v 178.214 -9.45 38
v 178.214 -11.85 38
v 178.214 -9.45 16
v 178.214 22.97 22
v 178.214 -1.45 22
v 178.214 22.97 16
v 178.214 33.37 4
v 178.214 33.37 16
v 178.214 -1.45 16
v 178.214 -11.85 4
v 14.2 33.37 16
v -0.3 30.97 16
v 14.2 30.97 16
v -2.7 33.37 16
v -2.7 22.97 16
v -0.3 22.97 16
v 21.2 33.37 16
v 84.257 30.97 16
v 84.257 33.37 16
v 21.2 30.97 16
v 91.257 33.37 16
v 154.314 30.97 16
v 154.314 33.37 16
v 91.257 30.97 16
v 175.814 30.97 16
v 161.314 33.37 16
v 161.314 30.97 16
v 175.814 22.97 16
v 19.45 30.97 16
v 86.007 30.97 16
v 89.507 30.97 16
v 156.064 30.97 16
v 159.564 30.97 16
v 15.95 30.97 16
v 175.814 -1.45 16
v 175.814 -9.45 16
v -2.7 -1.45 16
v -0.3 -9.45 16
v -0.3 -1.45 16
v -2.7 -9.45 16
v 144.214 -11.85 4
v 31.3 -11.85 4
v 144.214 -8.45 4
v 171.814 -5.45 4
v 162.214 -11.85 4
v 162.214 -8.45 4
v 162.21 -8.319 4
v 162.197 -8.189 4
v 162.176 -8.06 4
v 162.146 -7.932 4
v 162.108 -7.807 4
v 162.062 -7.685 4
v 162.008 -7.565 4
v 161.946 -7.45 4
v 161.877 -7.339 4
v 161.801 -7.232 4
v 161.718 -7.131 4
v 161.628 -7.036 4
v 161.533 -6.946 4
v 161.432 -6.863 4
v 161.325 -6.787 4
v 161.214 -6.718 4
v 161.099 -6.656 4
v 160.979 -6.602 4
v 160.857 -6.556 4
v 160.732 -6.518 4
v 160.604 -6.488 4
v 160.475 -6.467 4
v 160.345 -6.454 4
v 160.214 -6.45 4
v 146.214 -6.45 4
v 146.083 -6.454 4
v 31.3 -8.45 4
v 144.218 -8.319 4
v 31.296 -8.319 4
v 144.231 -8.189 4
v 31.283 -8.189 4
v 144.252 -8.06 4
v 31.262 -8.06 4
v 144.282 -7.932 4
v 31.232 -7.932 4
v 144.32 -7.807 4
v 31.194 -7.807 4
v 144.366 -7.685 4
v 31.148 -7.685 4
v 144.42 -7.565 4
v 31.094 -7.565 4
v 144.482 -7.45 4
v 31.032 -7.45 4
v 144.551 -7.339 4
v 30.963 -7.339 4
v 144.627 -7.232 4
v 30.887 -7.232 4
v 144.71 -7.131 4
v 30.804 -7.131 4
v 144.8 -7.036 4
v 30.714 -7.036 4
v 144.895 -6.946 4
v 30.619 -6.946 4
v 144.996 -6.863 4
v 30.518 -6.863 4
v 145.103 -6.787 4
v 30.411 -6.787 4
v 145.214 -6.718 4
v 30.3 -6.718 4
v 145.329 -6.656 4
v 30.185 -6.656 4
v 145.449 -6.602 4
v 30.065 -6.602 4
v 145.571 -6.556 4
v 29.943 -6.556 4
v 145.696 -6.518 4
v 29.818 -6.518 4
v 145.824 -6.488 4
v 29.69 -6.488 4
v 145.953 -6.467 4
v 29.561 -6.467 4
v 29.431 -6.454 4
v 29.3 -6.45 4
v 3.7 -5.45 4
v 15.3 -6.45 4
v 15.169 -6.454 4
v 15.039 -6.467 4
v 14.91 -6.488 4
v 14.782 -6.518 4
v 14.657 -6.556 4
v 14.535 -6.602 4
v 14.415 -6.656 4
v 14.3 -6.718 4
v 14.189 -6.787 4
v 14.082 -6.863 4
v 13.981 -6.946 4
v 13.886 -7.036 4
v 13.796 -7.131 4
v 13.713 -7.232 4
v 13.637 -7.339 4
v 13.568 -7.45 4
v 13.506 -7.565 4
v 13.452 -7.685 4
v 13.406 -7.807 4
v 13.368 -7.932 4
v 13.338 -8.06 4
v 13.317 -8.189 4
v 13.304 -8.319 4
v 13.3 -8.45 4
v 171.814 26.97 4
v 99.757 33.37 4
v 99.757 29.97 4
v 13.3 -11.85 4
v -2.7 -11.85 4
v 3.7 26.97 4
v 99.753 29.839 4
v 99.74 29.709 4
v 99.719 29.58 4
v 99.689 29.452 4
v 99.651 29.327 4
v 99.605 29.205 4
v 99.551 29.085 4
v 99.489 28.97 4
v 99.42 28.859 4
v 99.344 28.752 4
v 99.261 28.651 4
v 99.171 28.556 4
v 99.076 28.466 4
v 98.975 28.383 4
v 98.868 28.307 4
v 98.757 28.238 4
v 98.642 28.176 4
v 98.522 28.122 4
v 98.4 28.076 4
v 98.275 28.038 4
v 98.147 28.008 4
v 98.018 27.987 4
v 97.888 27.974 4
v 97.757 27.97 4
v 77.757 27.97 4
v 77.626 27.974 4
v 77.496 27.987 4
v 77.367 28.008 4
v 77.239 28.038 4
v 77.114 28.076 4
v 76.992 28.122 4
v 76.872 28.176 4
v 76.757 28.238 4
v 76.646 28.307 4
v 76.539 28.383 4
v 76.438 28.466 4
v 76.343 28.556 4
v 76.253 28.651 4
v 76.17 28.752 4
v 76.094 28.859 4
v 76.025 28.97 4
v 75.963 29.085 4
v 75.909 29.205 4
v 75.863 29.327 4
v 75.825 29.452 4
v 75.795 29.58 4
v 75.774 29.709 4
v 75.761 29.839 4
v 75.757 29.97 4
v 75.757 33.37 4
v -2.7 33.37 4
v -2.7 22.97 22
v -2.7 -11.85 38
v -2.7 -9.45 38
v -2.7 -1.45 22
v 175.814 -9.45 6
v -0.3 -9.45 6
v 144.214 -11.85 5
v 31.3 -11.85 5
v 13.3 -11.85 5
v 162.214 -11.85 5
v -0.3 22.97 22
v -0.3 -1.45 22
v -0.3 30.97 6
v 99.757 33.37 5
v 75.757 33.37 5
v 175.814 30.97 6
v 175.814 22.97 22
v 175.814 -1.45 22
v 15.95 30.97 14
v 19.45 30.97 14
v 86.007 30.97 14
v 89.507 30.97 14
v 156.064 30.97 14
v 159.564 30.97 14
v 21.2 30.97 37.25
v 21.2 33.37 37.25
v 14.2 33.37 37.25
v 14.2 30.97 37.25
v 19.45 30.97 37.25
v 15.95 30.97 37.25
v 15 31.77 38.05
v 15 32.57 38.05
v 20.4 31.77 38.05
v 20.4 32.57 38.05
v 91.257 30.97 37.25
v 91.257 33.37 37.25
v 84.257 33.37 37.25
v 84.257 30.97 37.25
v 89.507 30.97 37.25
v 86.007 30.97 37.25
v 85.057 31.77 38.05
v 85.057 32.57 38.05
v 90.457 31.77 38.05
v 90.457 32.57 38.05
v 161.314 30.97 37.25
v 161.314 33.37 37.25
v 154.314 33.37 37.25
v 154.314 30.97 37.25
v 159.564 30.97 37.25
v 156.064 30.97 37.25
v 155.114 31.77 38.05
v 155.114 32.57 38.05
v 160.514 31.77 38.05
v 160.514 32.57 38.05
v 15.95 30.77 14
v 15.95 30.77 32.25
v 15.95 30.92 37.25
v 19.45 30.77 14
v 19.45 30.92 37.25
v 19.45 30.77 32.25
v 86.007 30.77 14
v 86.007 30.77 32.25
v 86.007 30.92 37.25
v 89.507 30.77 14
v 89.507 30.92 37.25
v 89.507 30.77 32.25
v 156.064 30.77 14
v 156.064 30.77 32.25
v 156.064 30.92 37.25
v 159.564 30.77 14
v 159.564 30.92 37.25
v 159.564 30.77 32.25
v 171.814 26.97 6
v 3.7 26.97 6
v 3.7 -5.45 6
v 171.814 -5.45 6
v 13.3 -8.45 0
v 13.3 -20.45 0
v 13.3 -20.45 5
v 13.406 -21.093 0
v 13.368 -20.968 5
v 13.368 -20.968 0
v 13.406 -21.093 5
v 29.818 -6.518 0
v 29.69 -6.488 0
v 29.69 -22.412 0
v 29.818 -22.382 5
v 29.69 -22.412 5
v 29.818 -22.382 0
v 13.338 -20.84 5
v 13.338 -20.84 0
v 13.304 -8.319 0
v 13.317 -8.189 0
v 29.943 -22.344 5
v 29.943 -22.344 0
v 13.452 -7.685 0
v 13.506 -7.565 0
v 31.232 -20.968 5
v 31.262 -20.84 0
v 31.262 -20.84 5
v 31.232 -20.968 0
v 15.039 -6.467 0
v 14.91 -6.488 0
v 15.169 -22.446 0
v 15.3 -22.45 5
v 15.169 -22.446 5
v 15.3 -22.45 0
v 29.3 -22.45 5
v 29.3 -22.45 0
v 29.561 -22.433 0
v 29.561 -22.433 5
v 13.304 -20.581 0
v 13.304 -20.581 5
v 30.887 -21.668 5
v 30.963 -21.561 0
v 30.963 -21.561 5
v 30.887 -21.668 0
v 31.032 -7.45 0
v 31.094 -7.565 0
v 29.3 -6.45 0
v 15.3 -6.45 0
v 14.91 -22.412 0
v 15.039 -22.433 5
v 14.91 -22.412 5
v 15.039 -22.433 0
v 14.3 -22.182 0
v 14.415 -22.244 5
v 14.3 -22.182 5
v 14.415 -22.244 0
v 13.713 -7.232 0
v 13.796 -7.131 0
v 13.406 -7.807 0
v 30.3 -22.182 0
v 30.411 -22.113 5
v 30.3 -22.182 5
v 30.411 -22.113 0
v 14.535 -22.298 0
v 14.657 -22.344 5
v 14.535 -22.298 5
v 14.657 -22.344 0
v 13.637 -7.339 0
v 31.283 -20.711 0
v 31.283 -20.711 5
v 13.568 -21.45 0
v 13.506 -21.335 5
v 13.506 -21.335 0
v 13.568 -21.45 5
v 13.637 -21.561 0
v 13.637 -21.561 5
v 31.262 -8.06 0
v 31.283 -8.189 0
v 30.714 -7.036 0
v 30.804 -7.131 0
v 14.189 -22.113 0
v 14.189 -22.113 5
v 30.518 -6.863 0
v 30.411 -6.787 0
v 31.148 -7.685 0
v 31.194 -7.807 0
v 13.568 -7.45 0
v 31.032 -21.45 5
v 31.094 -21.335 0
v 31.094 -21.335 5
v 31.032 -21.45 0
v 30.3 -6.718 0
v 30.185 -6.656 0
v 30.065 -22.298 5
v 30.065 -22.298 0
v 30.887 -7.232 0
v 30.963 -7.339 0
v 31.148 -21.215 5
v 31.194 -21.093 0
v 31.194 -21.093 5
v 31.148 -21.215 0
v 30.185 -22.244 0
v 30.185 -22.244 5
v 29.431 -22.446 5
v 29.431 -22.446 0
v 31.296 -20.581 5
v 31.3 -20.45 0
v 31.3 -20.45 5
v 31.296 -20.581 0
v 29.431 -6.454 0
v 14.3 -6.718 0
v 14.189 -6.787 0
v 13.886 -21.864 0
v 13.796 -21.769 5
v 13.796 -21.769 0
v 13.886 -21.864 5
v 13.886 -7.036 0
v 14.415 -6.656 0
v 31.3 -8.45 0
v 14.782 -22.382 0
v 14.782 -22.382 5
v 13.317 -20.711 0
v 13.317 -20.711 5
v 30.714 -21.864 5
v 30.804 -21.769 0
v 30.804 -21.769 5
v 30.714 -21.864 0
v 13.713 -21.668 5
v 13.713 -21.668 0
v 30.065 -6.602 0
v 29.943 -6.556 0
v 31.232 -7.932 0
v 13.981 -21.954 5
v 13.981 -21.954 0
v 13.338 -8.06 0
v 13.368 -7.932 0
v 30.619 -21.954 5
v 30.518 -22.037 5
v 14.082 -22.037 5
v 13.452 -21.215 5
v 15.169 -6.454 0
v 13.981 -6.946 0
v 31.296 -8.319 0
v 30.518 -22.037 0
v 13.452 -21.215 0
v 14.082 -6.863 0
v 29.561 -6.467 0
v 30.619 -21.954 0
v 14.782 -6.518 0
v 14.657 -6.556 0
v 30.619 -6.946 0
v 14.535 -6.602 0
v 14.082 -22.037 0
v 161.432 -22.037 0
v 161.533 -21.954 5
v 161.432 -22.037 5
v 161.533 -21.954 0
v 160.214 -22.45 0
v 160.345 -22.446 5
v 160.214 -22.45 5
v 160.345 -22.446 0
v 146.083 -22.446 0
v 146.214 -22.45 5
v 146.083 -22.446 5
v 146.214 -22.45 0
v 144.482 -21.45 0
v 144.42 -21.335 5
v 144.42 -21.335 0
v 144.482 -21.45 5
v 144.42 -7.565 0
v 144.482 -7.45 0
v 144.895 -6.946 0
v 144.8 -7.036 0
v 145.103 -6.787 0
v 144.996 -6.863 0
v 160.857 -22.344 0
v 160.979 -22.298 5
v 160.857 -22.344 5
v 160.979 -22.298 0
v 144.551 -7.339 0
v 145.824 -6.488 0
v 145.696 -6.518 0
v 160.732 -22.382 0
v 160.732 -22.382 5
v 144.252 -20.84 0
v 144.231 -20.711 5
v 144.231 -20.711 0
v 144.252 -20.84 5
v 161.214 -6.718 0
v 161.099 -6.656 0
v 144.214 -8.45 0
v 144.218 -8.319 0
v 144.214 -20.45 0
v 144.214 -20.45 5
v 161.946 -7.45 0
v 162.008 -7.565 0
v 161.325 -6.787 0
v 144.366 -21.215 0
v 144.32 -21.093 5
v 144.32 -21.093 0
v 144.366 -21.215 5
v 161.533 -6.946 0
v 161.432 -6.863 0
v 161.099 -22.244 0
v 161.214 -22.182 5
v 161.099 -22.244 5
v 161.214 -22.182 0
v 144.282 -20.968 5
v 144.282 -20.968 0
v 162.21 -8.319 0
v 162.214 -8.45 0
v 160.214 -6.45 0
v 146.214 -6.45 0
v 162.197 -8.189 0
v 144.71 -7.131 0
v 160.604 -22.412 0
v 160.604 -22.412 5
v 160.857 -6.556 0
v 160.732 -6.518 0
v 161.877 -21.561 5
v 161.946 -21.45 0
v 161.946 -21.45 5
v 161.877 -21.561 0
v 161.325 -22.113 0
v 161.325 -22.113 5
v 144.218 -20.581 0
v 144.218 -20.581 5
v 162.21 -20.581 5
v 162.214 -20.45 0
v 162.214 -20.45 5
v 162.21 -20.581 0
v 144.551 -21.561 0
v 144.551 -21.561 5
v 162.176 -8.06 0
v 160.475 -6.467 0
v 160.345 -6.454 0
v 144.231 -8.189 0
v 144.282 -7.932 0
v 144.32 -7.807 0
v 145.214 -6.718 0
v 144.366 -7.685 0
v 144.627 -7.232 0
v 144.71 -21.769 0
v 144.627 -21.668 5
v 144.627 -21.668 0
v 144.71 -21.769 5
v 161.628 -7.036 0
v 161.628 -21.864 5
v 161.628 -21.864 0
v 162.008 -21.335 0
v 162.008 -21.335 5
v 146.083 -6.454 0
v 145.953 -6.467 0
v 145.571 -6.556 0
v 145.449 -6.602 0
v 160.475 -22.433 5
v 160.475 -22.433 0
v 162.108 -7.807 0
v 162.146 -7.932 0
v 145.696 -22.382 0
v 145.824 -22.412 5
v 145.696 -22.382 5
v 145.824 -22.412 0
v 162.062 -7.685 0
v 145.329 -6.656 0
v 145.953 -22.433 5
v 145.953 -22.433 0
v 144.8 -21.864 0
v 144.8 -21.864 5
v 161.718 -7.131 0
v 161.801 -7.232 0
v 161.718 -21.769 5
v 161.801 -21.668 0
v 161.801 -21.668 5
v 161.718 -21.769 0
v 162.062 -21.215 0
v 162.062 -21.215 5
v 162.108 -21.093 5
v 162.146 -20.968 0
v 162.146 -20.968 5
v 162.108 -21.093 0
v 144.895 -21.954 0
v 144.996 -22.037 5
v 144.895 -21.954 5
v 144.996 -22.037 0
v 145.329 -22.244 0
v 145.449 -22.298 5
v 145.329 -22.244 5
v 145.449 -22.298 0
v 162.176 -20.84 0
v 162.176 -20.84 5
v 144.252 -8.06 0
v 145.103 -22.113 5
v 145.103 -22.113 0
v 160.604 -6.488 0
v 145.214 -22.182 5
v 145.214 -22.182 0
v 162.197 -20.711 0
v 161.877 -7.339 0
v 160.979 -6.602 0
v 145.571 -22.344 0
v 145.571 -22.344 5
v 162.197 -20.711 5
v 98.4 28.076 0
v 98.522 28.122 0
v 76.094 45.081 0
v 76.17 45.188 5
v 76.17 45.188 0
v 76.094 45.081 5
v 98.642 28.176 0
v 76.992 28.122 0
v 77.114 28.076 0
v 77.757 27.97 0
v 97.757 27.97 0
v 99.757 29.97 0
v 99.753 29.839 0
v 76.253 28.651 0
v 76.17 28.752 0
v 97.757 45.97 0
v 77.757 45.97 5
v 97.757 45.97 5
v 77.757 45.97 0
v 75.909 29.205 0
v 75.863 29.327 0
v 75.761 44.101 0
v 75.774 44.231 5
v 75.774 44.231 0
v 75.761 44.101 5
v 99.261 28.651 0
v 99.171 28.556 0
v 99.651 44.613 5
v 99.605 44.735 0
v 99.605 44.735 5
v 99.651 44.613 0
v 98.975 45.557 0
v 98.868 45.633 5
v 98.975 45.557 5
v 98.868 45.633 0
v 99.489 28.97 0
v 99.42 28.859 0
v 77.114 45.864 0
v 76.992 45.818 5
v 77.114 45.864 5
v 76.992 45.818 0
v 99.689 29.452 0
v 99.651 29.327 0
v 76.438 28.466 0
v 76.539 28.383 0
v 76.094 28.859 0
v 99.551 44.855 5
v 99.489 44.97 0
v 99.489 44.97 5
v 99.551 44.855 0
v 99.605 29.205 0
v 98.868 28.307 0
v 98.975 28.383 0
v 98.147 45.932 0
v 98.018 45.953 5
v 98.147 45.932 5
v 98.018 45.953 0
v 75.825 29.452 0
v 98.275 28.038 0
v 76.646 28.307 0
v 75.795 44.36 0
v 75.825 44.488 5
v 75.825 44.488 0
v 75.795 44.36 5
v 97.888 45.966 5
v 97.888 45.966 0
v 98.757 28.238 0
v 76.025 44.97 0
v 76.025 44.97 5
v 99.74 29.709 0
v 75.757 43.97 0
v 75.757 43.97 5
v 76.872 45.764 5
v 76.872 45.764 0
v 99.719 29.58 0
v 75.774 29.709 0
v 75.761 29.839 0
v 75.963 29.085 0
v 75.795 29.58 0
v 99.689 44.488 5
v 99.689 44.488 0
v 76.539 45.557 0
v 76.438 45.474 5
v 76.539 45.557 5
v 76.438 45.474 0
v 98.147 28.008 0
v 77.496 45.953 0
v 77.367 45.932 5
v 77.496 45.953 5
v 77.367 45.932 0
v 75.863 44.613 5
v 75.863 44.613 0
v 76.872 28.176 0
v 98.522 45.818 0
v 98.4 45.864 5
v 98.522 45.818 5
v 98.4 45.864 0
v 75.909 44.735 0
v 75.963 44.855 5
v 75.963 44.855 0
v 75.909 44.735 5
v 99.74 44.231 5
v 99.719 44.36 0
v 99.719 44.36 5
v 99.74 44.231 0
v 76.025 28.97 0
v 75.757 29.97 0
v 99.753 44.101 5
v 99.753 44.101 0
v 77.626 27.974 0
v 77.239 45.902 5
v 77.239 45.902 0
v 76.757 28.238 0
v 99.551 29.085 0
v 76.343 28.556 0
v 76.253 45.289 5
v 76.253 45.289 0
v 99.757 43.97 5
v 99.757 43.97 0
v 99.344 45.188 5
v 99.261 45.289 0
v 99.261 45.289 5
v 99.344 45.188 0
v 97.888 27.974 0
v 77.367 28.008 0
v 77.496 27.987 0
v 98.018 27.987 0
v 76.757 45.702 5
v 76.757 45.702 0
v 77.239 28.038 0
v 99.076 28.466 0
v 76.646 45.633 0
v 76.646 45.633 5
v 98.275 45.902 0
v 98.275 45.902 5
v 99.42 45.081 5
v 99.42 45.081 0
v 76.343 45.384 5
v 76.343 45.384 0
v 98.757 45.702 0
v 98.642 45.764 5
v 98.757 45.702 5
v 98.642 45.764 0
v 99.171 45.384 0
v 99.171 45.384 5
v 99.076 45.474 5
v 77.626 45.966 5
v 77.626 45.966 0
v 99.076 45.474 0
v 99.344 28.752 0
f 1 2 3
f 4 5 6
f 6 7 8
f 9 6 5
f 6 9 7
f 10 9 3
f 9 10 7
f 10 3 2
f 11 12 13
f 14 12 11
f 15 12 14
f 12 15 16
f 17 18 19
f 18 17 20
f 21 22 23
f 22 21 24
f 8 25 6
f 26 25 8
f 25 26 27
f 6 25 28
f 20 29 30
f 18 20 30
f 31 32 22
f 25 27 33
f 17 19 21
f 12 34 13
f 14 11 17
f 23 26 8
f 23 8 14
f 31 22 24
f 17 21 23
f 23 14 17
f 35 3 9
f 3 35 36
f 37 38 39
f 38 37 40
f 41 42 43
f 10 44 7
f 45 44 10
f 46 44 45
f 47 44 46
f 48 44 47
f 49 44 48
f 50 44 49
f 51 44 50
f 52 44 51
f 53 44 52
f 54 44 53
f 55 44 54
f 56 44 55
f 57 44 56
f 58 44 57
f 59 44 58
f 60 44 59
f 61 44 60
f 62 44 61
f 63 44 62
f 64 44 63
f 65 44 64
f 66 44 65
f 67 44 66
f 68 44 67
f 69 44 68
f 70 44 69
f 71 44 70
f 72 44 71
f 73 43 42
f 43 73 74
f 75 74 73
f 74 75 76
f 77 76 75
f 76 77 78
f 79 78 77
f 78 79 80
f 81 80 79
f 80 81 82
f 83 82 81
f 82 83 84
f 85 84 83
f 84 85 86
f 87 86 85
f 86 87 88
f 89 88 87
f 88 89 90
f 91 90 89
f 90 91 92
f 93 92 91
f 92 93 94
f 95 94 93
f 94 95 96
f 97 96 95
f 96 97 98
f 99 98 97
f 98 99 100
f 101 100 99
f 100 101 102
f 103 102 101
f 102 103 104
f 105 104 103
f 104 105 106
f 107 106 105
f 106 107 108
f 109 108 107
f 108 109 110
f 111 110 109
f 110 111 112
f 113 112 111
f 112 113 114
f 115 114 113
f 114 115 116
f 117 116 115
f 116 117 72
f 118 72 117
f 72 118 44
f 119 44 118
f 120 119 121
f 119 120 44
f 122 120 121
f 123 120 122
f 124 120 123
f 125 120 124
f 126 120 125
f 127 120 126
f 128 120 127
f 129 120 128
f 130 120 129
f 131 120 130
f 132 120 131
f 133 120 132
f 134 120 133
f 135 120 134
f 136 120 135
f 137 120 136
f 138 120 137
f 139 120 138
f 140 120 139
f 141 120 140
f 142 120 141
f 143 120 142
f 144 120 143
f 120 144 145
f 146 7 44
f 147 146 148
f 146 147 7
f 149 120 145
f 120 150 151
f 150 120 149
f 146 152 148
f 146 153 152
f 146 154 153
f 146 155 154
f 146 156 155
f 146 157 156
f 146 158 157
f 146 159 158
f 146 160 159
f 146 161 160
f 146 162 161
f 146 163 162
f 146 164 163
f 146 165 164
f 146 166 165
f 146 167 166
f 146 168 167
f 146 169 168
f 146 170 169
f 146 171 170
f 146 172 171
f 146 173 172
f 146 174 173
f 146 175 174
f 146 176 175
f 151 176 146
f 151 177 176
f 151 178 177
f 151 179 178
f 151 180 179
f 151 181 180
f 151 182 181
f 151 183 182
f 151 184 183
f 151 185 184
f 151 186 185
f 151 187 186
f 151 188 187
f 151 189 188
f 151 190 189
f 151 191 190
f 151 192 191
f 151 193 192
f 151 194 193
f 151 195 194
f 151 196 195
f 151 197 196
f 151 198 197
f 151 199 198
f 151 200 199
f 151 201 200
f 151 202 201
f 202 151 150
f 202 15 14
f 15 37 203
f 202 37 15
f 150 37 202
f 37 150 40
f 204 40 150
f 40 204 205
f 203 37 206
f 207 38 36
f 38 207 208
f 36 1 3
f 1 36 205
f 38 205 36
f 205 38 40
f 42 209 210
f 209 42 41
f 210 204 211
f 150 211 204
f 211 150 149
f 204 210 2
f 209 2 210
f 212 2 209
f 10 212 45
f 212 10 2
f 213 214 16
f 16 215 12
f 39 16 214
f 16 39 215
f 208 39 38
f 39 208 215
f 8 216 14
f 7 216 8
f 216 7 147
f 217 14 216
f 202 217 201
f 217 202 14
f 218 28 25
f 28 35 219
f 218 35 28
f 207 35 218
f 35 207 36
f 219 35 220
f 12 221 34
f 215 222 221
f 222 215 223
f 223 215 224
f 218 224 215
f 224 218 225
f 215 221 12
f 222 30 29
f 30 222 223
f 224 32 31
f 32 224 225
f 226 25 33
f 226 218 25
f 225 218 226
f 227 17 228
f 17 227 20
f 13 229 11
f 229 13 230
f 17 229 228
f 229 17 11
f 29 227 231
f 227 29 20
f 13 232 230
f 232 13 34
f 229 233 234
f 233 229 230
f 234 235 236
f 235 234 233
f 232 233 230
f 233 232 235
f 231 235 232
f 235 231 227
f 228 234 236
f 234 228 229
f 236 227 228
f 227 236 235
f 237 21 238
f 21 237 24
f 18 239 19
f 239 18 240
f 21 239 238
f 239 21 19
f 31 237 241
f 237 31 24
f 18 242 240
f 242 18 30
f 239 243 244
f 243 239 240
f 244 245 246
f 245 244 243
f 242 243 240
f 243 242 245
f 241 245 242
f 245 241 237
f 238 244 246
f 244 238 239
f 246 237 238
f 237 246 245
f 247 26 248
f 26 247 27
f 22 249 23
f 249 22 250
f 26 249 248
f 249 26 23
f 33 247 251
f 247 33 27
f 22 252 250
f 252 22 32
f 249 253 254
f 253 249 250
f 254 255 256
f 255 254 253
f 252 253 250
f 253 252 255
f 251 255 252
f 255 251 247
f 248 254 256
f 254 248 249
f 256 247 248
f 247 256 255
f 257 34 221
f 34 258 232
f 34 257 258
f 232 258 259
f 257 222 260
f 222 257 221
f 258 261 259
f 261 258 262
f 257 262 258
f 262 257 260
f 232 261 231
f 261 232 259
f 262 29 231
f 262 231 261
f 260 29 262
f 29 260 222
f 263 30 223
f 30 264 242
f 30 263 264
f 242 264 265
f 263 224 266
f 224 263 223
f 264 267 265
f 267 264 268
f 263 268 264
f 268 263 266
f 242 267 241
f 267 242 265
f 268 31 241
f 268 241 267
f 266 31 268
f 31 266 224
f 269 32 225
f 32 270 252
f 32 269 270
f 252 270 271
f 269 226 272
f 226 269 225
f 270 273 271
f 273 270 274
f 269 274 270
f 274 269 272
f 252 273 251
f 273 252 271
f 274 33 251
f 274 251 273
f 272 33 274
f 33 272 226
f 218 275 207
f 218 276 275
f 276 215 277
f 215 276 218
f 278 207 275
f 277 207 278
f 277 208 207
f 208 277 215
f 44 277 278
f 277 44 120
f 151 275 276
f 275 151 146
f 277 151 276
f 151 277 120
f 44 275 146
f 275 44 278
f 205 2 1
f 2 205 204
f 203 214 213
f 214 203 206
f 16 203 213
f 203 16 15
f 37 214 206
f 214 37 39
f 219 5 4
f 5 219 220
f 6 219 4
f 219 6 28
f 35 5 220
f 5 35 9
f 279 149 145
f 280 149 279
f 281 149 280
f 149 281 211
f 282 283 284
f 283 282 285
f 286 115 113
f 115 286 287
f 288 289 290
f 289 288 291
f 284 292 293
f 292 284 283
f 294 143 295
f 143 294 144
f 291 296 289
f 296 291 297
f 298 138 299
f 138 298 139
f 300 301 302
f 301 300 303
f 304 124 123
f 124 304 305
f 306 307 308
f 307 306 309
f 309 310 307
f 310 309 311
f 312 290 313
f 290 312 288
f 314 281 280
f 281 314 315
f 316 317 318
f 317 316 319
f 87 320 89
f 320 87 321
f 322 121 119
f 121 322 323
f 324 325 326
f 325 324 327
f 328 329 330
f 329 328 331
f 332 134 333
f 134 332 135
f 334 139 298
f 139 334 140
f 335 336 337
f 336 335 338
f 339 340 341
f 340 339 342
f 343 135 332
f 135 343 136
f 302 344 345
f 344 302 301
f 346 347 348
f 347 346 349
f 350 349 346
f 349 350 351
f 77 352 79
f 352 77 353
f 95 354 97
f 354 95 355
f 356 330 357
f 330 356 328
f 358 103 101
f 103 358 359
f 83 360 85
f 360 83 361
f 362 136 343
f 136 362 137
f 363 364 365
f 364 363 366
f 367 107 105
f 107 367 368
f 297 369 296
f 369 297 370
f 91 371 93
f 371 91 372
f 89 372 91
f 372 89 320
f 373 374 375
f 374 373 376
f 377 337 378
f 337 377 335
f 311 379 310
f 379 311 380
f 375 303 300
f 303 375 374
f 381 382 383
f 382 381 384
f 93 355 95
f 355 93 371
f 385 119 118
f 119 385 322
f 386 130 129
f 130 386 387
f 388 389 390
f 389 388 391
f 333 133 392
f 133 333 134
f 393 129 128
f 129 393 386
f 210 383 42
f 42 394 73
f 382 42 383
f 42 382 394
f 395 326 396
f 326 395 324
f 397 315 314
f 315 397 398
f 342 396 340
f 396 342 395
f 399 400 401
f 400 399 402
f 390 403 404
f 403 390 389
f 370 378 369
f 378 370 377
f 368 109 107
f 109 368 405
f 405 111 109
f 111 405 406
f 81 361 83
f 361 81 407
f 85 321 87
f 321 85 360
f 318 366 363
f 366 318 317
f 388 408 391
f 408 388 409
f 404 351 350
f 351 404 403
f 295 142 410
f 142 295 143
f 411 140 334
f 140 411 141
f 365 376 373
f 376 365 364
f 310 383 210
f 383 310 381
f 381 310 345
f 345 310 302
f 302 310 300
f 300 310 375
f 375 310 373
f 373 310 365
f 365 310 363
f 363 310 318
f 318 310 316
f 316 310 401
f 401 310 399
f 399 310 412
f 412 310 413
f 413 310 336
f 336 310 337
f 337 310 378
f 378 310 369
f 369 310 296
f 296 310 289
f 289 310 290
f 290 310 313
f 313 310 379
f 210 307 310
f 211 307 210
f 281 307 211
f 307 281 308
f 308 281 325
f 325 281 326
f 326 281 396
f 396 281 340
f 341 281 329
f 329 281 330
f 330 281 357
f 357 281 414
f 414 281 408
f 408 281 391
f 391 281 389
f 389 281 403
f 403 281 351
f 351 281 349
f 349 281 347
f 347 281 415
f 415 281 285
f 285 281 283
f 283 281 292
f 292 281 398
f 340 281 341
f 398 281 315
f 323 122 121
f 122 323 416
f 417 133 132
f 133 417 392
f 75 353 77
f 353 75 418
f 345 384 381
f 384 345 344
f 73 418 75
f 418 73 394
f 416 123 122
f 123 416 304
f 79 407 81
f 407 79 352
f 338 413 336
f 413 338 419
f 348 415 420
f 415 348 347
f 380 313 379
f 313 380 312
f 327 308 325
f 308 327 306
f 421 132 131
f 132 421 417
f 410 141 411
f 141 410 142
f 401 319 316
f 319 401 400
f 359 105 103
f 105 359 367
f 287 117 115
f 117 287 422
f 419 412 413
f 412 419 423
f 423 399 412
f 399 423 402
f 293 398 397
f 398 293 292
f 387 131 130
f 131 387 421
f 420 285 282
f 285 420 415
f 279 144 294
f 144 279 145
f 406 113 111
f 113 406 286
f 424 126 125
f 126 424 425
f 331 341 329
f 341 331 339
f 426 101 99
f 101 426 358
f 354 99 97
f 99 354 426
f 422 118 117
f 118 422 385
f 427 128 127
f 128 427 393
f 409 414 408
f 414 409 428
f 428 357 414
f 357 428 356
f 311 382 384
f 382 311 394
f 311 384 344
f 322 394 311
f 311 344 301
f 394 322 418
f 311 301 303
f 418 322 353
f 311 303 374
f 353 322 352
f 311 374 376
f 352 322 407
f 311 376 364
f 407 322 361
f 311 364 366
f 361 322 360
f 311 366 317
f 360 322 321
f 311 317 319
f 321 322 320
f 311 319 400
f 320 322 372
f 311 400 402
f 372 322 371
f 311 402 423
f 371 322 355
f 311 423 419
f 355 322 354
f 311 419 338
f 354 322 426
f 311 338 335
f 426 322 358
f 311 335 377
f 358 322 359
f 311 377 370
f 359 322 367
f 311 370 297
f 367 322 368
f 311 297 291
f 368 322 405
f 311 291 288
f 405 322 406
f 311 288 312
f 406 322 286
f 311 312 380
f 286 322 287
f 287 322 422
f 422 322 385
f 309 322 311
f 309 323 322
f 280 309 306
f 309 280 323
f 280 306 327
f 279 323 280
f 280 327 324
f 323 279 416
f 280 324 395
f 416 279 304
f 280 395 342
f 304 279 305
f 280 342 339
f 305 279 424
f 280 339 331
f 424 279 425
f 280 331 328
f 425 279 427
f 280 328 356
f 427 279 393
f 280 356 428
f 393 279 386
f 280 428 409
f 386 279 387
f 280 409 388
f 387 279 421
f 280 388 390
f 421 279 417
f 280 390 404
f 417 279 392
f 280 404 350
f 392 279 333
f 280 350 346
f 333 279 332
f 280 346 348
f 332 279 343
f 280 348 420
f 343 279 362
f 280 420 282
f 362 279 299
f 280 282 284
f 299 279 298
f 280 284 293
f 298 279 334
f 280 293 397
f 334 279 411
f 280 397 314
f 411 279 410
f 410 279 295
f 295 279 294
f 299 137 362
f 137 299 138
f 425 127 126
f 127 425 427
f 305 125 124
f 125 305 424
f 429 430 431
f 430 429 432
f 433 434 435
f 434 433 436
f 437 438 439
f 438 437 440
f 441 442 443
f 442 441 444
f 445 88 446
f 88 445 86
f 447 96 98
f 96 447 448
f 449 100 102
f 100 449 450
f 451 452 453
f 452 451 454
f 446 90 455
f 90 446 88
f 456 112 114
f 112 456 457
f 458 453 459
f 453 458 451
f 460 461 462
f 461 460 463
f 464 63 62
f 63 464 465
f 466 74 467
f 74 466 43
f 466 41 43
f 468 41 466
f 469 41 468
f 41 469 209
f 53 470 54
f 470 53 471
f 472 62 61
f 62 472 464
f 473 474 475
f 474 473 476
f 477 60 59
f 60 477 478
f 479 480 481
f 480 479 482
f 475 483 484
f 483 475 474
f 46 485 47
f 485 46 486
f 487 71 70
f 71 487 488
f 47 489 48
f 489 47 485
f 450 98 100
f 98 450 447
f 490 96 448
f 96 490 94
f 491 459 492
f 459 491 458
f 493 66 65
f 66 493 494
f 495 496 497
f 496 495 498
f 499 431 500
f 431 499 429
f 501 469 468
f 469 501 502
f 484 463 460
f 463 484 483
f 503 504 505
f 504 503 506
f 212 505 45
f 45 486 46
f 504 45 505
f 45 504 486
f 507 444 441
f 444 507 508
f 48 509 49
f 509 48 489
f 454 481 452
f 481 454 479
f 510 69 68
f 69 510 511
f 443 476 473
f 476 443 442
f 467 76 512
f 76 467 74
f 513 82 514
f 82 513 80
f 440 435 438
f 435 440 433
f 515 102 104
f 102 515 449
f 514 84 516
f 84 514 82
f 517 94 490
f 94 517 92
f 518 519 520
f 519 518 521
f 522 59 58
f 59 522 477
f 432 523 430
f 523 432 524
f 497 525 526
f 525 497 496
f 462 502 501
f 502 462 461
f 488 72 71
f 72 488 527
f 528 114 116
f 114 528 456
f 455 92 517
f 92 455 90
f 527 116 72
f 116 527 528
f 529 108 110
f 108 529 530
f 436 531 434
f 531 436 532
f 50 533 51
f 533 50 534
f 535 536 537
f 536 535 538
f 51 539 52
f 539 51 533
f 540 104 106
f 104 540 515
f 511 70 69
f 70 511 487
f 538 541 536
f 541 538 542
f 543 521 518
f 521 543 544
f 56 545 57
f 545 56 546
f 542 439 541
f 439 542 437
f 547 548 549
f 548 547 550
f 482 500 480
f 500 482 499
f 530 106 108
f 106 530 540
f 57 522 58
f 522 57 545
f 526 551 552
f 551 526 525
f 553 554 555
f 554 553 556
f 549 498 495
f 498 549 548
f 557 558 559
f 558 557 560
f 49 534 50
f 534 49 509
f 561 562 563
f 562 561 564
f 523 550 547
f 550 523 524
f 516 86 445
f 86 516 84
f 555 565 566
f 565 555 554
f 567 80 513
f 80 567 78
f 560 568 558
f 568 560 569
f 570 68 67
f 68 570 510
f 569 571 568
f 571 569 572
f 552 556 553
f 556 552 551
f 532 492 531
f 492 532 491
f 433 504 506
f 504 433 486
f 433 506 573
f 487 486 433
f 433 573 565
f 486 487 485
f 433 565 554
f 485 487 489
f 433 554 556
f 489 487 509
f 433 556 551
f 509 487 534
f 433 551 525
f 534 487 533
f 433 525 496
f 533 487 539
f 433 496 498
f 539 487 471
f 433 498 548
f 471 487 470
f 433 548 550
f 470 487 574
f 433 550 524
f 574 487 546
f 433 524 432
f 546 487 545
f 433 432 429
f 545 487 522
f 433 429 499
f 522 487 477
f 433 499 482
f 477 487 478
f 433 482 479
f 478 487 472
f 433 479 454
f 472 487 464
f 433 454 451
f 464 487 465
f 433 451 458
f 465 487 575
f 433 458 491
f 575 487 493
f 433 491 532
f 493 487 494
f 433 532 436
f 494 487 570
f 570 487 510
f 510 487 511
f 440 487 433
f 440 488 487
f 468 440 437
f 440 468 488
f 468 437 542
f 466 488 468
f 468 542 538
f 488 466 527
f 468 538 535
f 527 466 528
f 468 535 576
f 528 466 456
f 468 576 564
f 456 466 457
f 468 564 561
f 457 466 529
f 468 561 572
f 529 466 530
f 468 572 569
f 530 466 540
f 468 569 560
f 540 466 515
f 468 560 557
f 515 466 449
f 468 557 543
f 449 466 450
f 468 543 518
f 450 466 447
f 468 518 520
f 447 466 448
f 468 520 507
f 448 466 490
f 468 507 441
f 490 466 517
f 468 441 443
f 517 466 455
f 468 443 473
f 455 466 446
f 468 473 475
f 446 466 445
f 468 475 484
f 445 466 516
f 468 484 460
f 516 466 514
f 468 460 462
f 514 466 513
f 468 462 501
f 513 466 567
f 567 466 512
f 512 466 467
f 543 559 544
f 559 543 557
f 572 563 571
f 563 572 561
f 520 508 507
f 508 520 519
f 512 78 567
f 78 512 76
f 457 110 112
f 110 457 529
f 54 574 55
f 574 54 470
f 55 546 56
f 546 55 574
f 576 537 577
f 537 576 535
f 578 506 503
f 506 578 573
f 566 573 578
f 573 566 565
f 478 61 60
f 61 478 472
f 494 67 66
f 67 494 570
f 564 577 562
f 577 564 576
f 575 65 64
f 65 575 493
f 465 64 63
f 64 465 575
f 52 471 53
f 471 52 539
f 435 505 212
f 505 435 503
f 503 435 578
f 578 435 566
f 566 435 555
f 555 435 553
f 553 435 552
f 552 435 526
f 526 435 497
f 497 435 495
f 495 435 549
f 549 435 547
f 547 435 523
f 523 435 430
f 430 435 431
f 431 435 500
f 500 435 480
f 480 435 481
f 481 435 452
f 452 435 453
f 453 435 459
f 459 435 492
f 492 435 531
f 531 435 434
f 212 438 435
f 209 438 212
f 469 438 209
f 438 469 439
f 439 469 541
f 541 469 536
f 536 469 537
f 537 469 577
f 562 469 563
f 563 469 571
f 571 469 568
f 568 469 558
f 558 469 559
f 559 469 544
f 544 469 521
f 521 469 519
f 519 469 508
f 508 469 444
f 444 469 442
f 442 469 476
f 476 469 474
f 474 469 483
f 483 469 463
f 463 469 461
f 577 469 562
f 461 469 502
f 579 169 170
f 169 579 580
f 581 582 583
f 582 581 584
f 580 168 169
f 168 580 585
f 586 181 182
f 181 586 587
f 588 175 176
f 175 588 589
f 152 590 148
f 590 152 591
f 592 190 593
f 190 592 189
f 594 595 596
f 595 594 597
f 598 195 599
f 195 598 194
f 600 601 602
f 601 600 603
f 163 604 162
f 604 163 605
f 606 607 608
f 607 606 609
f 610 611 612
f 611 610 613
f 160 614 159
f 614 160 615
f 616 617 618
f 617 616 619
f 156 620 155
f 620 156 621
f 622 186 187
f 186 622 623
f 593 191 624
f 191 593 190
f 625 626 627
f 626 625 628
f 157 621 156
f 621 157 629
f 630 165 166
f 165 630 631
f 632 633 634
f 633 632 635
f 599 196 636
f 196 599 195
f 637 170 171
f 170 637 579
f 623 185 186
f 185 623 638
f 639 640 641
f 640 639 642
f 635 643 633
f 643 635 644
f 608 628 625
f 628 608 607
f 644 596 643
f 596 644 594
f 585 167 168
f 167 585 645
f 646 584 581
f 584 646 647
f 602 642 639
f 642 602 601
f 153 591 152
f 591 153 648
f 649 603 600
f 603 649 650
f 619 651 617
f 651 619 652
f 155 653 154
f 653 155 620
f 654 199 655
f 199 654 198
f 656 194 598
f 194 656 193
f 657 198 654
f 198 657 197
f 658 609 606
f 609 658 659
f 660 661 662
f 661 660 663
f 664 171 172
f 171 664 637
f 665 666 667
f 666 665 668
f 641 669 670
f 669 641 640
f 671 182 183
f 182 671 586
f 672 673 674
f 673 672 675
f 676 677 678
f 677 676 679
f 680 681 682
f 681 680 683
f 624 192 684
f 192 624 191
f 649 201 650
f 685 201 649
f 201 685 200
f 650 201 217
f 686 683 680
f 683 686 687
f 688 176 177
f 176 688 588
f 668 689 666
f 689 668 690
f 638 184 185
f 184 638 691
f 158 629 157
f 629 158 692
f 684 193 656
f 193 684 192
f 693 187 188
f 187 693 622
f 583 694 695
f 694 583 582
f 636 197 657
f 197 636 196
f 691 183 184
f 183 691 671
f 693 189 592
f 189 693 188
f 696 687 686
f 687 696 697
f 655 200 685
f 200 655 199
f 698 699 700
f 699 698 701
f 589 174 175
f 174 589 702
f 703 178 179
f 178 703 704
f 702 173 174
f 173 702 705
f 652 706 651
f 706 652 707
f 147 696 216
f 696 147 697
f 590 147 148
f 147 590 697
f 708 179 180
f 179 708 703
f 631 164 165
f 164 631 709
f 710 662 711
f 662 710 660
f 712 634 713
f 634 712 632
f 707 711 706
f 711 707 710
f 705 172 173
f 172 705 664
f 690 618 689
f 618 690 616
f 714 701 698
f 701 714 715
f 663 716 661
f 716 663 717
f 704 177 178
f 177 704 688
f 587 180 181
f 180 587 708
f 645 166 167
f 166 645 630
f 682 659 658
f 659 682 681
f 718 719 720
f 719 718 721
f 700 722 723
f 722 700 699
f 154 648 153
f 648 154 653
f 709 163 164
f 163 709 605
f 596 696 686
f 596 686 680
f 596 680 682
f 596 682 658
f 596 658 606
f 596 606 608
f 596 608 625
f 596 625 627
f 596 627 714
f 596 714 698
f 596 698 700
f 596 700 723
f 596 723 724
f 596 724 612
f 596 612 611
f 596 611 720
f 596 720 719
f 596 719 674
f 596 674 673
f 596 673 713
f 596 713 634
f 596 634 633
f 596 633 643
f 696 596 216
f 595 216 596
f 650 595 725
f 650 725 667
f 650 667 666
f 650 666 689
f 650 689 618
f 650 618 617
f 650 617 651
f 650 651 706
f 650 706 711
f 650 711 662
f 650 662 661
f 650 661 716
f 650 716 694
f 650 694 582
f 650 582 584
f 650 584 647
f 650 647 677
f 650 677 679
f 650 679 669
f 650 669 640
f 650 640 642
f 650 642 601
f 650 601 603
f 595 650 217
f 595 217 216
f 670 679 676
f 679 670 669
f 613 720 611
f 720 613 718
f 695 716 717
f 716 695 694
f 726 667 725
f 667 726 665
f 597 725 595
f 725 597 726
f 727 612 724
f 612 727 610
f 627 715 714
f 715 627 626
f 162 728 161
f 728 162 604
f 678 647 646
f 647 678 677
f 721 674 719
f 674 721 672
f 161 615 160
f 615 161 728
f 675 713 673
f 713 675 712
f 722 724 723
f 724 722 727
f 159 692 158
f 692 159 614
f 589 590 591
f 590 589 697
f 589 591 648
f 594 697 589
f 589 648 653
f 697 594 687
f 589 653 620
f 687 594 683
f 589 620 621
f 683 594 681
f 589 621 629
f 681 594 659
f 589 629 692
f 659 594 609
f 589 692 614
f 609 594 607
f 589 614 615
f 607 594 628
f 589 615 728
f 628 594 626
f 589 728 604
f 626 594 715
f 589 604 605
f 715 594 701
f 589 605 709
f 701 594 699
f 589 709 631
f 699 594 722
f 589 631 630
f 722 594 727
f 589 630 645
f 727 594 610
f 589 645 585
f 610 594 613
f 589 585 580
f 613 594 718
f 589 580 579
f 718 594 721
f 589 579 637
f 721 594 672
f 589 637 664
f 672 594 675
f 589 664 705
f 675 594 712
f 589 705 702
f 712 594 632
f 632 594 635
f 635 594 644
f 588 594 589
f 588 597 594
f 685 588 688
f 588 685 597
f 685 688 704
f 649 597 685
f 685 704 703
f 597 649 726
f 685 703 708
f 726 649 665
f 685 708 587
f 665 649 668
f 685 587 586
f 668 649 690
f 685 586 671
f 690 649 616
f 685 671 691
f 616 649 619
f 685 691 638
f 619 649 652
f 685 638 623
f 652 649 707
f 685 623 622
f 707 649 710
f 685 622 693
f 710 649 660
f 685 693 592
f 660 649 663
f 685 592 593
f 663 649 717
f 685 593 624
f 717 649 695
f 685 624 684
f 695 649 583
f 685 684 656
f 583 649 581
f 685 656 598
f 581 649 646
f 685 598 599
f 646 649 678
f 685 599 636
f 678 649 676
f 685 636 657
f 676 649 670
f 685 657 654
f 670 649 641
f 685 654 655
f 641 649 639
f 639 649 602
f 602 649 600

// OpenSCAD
$fn = 96;
eps = 0.05;

// =========================================================
// DETACHABLE FRONT BAND + SIDE WALLS + REAR POSTS + FEETS
// Continuous low rail all around.
// Side walls sit on rail but do not connect to front/back above rail.
// Non-friction resting fit.
//
// Corrected:
// - Feet overlap collar/body in Z by foot_body_z_overlap, not just eps.
// - Each foot is shifted a few mm inward under the basket while keeping
//   the original front/rear foot depth.
// =========================================================

inch = 25.4;

// CASSETTE REFERENCE VALUES
cassette_w = 6.91 * inch;

bottom_t    = 3.0;
wall_t      = 3.0;
wall_offset = 0.0;

front_frame_t    = 1.2;
acrylic_gap      = 1.0;
spacer_thickness = 7.0;

front_buildout_total = front_frame_t + acrylic_gap + spacer_thickness;
front_buildout_y0    = wall_offset - front_buildout_total;

roller_r    = 0.75 * inch;
glide_t     = 2.0;
fang_embed  = 0.6;
rail_back_y = 8.0;
roller_cy   = wall_offset + wall_t;

glide_y  = roller_cy + roller_r - glide_t - fang_embed;
bottom_d = glide_y + glide_t + rail_back_y;

backing_board_extra_y = 1/20 * inch;

cassette_x0 = 0;
cassette_x1 = cassette_w;
cassette_y0 = front_buildout_y0;
cassette_y1 = bottom_d + backing_board_extra_y;

// FIT / GEOMETRY
clear_x = 0.3;
clear_y = 0.25;

collar_t = 2.4;

foot_h = 5.0;
foot_body_z_overlap = 1.0;
collar_z0 = foot_h - foot_body_z_overlap;

collar_h = 34.0;
side_wall_h = 18.0;
inner_x0 = cassette_x0 - clear_x;
inner_x1 = cassette_x1 + clear_x;
inner_y0 = cassette_y0 - clear_y;
inner_y1 = cassette_y1 + clear_y;

outer_x0 = inner_x0 - collar_t;
outer_x1 = inner_x1 + collar_t;
outer_y0 = inner_y0 - collar_t;
outer_y1 = inner_y1 + collar_t;

// RESTING LEDGE
rest_lip_t = 4.0;
rest_lip_h = 2.0;

// LOW RAIL
low_rail_h = 12.0;

// SIDE WALLS
side_wall_gap_front = 8.0;
side_wall_gap_rear  = 8.0;
side_wall_t = collar_t;

// REAR POSTS
rear_post_w = 7.0;
rear_post_t = collar_t;
post_bevel = 0.8;

// Localized friction take-up on the three rear backing-board capture posts.
// These project into the existing Y clearance without moving the posts or
// tightening the stand's overall envelope. The upper ramp eases insertion.
rear_post_friction_pad_d = 0.20;
rear_post_friction_pad_w = 3.5;
rear_post_friction_pad_z0 = collar_z0 + low_rail_h - 2.0;
rear_post_friction_pad_z1 = collar_z0 + collar_h - post_bevel;
rear_post_friction_ramp_h = 5.0;

// FEET
front_foot_proj = 16.0;
rear_foot_proj  = 18.0;

front_foot_w = 18.0;
rear_foot_w  = 24.0;

front_foot_inset_x = 16.0;
foot_round = 2.0;

// How far the inner edge of each foot reaches under the basket.
// Original effectively stopped ~0.6 mm short of the inner edge.
foot_y_overlap = 3.0;

// HELPERS
module rounded_rect_prism(x0, x1, y0, y1, z0, z1, r=2) {
    hull() {
        translate([x0+r, y0+r, z0]) cylinder(r=r, h=z1-z0);
        translate([x1-r, y0+r, z0]) cylinder(r=r, h=z1-z0);
        translate([x0+r, y1-r, z0]) cylinder(r=r, h=z1-z0);
        translate([x1-r, y1-r, z0]) cylinder(r=r, h=z1-z0);
    }
}

module beveled_post(xsz, ysz, h, b) {
    bx = min(b, xsz/2 - eps);
    by = min(b, ysz/2 - eps);

    union() {
        cube([xsz, ysz, h - b]);

        translate([0, 0, h - b])
        hull() {
            cube([xsz, ysz, eps]);

            translate([bx, by, b])
                cube([
                    max(eps, xsz - 2*bx),
                    max(eps, ysz - 2*by),
                    eps
                ]);
        }
    }
}

// FRONT BAND
module front_band() {
    translate([outer_x0, outer_y0, collar_z0])
        cube([
            outer_x1 - outer_x0,
            collar_t,
            collar_h
        ]);
}

// CONTINUOUS LOW RAIL
module front_low_rail() {
    translate([outer_x0, outer_y0, collar_z0])
        cube([outer_x1 - outer_x0, collar_t, low_rail_h]);
}

module left_low_rail() {
    translate([outer_x0, outer_y0, collar_z0])
        cube([collar_t, outer_y1 - outer_y0, low_rail_h]);
}

module right_low_rail() {
    translate([outer_x1 - collar_t, outer_y0, collar_z0])
        cube([collar_t, outer_y1 - outer_y0, low_rail_h]);
}

module rear_low_rail() {
    translate([outer_x0, outer_y1 - collar_t, collar_z0])
        cube([outer_x1 - outer_x0, collar_t, low_rail_h]);
}

module low_rails() {
    // front rail overlaps lower part of front band; harmless and strengthens base
    front_low_rail();
    left_low_rail();
    right_low_rail();
    rear_low_rail();
}

// SIDE WALLS
module left_side_wall() {
    y0 = inner_y0 + side_wall_gap_front;
    y1 = inner_y1 - side_wall_gap_rear;

    translate([outer_x0, y0, collar_z0])
        cube([
            side_wall_t,
            y1 - y0,
            side_wall_h
        ]);
}

module right_side_wall() {
    y0 = inner_y0 + side_wall_gap_front;
    y1 = inner_y1 - side_wall_gap_rear;

    translate([inner_x1, y0, collar_z0])
        cube([
            side_wall_t,
            y1 - y0,
            side_wall_h
        ]);
}

// REAR POSTS
module rear_post(x_center) {
    translate([x_center - rear_post_w/2, inner_y1, collar_z0])
        beveled_post(rear_post_w, rear_post_t, collar_h, post_bevel);
}

module rear_post_friction_pad(x_center) {
    pad_x0 = x_center - rear_post_friction_pad_w/2;
    full_pad_y0 = inner_y1 - rear_post_friction_pad_d;
    ramp_z0 = rear_post_friction_pad_z1 - rear_post_friction_ramp_h;

    hull() {
        translate([pad_x0, full_pad_y0, rear_post_friction_pad_z0])
            cube([rear_post_friction_pad_w, rear_post_friction_pad_d + eps, eps]);
        translate([pad_x0, full_pad_y0, ramp_z0])
            cube([rear_post_friction_pad_w, rear_post_friction_pad_d + eps, eps]);
        translate([pad_x0, inner_y1 - eps, rear_post_friction_pad_z1])
            cube([rear_post_friction_pad_w, 2*eps, eps]);
    }
}

module rear_posts() {
    left_post_x = inner_x0 + 18.0;
    center_post_x = (inner_x0 + inner_x1) / 2;
    right_post_x = inner_x1 - 18.0;

    rear_post(left_post_x);
    rear_post(center_post_x);
    rear_post(right_post_x);

    rear_post_friction_pad(left_post_x);
    rear_post_friction_pad(center_post_x);
    rear_post_friction_pad(right_post_x);
}

// BOTTOM RESTING LEDGE
module bottom_rest_lip() {
    translate([inner_x0, inner_y0, collar_z0])
        cube([inner_x1 - inner_x0, rest_lip_t, rest_lip_h]);

    translate([inner_x0, inner_y1 - rest_lip_t, collar_z0])
        cube([inner_x1 - inner_x0, rest_lip_t, rest_lip_h]);

    translate([inner_x0, inner_y0, collar_z0])
        cube([rest_lip_t, inner_y1 - inner_y0, rest_lip_h]);

    translate([inner_x1 - rest_lip_t, inner_y0, collar_z0])
        cube([rest_lip_t, inner_y1 - inner_y0, rest_lip_h]);
}

// FEET
module front_left_foot() {
    x0 = outer_x0 + front_foot_inset_x;
    x1 = x0 + front_foot_w;

    // Same foot depth as original, shifted inward for a few mm of underlap.
    y1 = inner_y0 + foot_y_overlap;
    y0 = y1 - front_foot_proj;

    rounded_rect_prism(x0, x1, y0, y1, 0, foot_h, foot_round);
}

module front_right_foot() {
    x1 = outer_x1 - front_foot_inset_x;
    x0 = x1 - front_foot_w;

    // Same foot depth as original, shifted inward for a few mm of underlap.
    y1 = inner_y0 + foot_y_overlap;
    y0 = y1 - front_foot_proj;

    rounded_rect_prism(x0, x1, y0, y1, 0, foot_h, foot_round);
}

module rear_center_foot() {
    x0 = (outer_x0 + outer_x1)/2 - rear_foot_w/2;
    x1 = x0 + rear_foot_w;

    // Same foot depth as original, shifted inward for a few mm of underlap.
    y0 = inner_y1 - foot_y_overlap;
    y1 = y0 + rear_foot_proj;

    rounded_rect_prism(x0, x1, y0, y1, 0, foot_h, foot_round);
}

// FINAL
union() {
    front_band();
    low_rails();

    left_side_wall();
    right_side_wall();
    rear_posts();

    bottom_rest_lip();

    front_left_foot();
    front_right_foot();
    rear_center_foot();
}
